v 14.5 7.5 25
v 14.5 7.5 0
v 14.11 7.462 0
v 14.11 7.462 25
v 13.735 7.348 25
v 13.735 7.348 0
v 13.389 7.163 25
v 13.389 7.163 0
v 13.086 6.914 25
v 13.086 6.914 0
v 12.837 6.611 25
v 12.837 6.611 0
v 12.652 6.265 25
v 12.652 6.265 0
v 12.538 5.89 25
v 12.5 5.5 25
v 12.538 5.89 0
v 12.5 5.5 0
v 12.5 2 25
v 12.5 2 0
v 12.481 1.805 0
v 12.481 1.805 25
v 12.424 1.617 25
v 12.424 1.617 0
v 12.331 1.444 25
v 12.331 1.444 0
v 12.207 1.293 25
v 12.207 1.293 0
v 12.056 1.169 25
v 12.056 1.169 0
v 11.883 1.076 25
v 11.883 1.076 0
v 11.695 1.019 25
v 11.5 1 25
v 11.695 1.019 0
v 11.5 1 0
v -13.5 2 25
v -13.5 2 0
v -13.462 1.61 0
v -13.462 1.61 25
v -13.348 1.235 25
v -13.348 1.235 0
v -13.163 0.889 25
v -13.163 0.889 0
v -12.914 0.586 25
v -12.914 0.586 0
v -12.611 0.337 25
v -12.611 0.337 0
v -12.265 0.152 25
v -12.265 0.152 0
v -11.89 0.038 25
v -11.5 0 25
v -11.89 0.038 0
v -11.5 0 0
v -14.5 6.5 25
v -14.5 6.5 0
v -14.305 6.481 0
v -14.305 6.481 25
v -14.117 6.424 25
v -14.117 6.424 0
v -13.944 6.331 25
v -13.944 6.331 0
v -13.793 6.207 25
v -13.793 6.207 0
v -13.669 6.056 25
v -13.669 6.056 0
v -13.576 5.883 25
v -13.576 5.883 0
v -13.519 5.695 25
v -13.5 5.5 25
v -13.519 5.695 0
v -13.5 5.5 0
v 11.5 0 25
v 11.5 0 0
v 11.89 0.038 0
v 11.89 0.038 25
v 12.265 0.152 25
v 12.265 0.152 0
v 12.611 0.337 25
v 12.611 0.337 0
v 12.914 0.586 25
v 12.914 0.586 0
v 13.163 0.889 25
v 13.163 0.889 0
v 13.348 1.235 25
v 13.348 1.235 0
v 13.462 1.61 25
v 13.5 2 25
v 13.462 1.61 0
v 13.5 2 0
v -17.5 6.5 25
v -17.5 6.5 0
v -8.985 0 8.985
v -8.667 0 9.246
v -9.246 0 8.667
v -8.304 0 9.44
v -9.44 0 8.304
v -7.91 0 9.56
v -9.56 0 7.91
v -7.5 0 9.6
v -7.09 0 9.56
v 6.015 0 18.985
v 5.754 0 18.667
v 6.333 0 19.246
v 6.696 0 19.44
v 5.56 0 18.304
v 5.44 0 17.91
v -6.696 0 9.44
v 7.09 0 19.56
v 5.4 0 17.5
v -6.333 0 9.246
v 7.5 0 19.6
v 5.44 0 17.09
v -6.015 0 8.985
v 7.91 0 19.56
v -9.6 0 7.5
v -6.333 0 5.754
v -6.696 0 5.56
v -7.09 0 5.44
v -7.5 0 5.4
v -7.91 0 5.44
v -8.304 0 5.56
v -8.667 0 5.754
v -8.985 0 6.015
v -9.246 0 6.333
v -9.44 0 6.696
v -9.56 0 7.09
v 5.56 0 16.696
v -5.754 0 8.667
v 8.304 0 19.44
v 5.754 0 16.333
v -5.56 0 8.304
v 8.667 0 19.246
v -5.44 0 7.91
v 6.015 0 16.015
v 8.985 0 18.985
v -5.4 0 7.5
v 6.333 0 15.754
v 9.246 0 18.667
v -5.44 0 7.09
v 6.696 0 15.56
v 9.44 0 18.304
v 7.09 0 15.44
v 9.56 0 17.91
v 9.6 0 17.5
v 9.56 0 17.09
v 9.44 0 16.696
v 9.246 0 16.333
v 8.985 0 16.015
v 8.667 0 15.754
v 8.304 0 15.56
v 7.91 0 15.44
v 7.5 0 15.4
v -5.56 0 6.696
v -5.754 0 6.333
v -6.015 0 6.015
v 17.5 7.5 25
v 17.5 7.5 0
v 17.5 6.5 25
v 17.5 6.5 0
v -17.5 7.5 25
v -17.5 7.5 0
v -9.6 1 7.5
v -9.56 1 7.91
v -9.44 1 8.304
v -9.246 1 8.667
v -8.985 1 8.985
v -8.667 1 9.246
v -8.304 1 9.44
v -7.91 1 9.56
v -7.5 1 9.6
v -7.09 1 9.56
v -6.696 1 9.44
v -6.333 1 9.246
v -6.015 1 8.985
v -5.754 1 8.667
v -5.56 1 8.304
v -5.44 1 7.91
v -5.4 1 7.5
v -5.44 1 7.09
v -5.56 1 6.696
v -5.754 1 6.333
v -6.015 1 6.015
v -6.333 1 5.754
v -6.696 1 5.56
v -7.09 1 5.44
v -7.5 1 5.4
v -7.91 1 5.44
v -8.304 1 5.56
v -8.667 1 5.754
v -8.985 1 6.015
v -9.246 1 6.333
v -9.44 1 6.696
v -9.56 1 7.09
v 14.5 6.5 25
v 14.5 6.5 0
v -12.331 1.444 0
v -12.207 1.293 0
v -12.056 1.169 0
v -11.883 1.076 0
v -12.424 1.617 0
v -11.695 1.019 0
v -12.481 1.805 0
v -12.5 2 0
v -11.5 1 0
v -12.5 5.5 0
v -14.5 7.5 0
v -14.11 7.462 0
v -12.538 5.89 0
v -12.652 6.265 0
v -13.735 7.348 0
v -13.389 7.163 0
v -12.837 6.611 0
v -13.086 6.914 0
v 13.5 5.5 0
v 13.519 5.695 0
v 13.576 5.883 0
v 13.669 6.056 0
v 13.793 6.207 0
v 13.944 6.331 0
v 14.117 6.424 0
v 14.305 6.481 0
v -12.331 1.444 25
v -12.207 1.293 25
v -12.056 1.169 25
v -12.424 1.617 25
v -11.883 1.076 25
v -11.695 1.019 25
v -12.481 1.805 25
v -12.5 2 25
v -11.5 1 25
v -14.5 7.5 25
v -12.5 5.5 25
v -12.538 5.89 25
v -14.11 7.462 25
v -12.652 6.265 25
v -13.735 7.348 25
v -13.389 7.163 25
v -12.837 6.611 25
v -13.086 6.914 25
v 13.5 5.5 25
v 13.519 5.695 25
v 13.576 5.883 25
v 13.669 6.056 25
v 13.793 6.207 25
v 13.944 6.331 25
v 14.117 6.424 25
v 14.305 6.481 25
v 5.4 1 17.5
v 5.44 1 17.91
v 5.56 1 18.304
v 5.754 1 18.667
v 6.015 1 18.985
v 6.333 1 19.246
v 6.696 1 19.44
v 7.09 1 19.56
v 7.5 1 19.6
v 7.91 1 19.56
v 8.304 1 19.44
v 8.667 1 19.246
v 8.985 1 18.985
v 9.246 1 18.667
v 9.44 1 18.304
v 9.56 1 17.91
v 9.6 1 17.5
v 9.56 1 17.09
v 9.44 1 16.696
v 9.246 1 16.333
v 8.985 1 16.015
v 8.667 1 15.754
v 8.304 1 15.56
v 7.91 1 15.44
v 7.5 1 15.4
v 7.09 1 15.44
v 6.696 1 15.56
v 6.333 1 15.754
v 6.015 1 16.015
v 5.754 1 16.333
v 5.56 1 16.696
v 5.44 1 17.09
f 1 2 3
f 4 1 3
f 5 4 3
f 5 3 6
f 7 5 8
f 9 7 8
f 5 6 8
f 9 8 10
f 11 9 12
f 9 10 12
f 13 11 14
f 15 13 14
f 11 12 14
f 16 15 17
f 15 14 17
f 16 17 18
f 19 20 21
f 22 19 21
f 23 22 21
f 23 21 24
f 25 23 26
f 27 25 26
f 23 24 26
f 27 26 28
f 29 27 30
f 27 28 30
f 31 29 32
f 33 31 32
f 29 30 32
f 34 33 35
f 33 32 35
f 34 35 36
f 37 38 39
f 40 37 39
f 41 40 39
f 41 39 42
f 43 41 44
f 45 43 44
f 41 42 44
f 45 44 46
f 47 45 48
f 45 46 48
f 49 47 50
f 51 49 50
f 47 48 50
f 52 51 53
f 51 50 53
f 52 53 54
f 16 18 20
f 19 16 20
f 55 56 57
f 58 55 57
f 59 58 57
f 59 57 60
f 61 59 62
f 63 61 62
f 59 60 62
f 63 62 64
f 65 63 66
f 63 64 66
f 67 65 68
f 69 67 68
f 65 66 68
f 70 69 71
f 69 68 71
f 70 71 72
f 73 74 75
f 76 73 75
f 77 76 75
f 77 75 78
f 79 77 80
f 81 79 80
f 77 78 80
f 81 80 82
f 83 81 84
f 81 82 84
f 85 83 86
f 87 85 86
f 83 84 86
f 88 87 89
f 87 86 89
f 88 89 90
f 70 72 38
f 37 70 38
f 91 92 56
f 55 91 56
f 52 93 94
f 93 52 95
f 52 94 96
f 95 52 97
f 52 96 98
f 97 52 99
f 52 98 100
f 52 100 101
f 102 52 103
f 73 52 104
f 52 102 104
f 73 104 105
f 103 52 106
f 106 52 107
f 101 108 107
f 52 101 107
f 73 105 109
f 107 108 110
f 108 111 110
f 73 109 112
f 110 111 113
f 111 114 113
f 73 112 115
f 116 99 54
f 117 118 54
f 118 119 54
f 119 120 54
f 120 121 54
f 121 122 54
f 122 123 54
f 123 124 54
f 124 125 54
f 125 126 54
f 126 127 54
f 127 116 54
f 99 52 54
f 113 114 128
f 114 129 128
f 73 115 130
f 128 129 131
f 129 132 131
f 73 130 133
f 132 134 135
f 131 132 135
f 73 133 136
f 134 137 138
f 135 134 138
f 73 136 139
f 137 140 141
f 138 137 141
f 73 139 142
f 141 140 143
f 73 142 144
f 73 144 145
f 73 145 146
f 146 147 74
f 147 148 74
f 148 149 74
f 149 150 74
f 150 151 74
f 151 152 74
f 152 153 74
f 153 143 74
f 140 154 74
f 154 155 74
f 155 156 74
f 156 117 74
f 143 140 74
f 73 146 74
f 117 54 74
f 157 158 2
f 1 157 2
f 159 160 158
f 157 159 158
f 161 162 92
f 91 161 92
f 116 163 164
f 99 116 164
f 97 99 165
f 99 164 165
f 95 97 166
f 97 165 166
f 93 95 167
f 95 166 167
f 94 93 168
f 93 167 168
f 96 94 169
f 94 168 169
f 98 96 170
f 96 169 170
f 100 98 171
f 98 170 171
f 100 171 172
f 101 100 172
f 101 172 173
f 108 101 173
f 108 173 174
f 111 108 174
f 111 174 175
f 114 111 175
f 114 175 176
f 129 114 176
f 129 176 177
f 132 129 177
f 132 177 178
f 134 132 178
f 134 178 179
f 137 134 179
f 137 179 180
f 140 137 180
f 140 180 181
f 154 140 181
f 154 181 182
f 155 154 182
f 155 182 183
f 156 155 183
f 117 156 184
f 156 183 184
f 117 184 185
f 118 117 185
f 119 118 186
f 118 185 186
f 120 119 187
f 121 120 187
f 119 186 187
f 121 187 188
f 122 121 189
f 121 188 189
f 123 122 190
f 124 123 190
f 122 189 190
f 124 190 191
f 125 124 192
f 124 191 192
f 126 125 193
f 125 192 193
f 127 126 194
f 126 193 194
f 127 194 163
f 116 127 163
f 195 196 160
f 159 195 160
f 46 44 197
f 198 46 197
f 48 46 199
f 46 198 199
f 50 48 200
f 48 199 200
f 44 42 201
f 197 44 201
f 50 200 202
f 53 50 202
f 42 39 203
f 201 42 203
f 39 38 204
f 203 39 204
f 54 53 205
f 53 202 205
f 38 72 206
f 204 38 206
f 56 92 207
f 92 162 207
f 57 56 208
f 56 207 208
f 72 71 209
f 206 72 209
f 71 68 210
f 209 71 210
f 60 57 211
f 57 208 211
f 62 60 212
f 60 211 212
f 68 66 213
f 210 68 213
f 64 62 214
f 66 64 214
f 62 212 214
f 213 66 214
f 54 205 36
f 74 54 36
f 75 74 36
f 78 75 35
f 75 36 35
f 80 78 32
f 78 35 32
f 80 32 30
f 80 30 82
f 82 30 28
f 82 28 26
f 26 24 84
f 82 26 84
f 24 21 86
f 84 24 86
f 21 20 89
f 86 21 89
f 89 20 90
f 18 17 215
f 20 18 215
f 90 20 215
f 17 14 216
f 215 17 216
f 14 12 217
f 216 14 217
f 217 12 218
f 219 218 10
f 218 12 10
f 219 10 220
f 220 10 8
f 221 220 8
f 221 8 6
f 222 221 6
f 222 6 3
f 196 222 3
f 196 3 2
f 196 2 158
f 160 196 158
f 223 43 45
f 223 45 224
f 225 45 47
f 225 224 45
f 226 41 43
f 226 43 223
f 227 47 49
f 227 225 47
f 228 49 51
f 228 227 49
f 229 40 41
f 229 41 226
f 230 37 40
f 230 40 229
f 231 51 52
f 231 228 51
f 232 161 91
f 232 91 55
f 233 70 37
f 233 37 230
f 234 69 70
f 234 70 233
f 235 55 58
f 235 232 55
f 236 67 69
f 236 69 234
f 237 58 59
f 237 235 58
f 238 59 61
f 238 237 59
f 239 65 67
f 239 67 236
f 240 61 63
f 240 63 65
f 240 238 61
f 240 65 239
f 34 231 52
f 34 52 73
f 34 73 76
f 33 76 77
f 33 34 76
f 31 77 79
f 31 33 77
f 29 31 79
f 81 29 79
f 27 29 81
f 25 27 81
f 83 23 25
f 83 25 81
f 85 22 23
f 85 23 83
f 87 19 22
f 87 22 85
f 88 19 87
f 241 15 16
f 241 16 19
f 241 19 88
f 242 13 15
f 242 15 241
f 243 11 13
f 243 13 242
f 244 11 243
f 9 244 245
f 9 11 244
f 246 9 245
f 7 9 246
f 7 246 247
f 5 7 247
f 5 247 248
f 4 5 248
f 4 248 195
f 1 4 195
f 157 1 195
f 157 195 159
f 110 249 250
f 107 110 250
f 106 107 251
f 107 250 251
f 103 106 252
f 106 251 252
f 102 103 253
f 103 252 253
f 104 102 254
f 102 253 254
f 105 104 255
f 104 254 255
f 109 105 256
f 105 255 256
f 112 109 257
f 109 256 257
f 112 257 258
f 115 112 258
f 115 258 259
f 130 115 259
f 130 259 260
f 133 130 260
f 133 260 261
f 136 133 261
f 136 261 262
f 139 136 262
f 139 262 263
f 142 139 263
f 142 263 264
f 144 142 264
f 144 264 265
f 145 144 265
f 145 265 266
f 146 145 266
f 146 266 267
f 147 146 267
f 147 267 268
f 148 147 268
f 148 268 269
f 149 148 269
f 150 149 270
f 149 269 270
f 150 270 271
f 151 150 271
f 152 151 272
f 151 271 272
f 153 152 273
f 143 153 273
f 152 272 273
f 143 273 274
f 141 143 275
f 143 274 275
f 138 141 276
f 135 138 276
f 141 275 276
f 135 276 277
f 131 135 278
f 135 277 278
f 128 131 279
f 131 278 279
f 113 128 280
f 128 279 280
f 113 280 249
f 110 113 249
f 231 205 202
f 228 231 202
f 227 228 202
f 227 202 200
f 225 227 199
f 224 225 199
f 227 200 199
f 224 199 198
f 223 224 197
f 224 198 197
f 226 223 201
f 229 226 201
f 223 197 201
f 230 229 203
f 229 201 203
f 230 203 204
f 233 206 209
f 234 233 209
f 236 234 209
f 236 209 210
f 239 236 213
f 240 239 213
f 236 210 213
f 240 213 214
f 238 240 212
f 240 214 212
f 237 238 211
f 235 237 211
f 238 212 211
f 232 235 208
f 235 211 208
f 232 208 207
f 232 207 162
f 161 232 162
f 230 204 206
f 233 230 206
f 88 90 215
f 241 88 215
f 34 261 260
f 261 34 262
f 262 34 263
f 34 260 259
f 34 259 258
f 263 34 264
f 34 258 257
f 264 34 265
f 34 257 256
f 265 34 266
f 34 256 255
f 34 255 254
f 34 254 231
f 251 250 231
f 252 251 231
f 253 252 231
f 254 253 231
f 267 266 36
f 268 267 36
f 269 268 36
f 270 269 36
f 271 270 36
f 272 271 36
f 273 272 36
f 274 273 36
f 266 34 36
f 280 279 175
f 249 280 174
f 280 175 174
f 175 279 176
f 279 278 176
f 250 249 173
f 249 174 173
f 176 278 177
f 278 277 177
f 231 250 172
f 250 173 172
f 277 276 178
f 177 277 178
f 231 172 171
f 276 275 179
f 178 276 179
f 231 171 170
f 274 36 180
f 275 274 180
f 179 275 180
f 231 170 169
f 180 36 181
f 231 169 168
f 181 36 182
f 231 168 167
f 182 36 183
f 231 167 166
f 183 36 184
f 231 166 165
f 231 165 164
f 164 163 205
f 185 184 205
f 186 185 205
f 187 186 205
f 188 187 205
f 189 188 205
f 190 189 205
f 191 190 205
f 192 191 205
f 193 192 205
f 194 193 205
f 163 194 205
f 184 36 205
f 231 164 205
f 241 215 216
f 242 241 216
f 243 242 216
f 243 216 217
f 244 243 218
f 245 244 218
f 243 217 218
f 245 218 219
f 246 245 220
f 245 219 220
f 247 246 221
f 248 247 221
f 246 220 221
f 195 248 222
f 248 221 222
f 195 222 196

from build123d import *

# Parameters (mm, degrees)
EXTRUDE_1_DEPTH     = 90
CUT_EXTRUDE_START   = -65
CUT_EXTRUDE_2_DEPTH = 65
SKETCH_4_R          = 2.1
CUT_EXTRUDE_3_DEPTH = 10


with BuildPart() as part:
    # Эскиз1 → Вытянуть1 (new body)
    with BuildSketch(Plane.XY):
        with BuildLine():
            Line((-17.5, 6.5), (-14.5, 6.5))
            ThreePointArc((-14.5, 6.5), (-13.792893219, 6.207106781), (-13.5, 5.5))
            Line((-13.5, 5.5), (-13.5, 2))
            ThreePointArc((-13.5, 2), (-12.914213562, 0.585786438), (-11.5, 0))
            Line((-11.5, 0), (11.5, 0))
            ThreePointArc((11.5, 0), (12.914213562, 0.585786438), (13.5, 2))
            Line((13.5, 2), (13.5, 5.5))
            ThreePointArc((13.5, 5.5), (13.792893219, 6.207106781), (14.5, 6.5))
            Line((14.5, 6.5), (17.5, 6.5))
            Line((17.5, 6.5), (17.5, 7.5))
            Line((17.5, 7.5), (14.5, 7.5))
            ThreePointArc((14.5, 7.5), (13.085786438, 6.914213562), (12.5, 5.5))
            Line((12.5, 5.5), (12.5, 2))
            ThreePointArc((12.5, 2), (12.207106781, 1.292893219), (11.5, 1))
            Line((11.5, 1), (-11.5, 1))
            ThreePointArc((-11.5, 1), (-12.207106781, 1.292893219), (-12.5, 2))
            Line((-12.5, 2), (-12.5, 5.5))
            ThreePointArc((-12.5, 5.5), (-13.085786438, 6.914213562), (-14.5, 7.5))
            Line((-14.5, 7.5), (-17.5, 7.5))
            Line((-17.5, 7.5), (-17.5, 6.5))
        make_face()
    extrude(amount=EXTRUDE_1_DEPTH)

    # Эскиз3 → Вырез-Вытянуть2 (cut)
    with BuildSketch(Plane.XY.offset(90).offset(CUT_EXTRUDE_START)):
        with BuildLine():
            Line((-17.5, 7.5), (-17.5, 6.5))
            Line((-17.5, 6.5), (-14.5, 6.5))
            ThreePointArc((-14.5, 6.5), (-13.792893219, 6.207106781), (-13.5, 5.5))
            Line((-13.5, 5.5), (-13.5, 2))
            ThreePointArc((-13.5, 2), (-12.914213562, 0.585786438), (-11.5, 0))
            Line((-11.5, 0), (11.5, 0))
            ThreePointArc((11.5, 0), (12.914213562, 0.585786438), (13.5, 2))
            Line((13.5, 2), (13.5, 5.5))
            ThreePointArc((13.5, 5.5), (13.792893219, 6.207106781), (14.5, 6.5))
            Line((14.5, 6.5), (17.5, 6.5))
            Line((17.5, 6.5), (17.5, 7.5))
            Line((17.5, 7.5), (14.5, 7.5))
            ThreePointArc((14.5, 7.5), (13.085786438, 6.914213562), (12.5, 5.5))
            Line((12.5, 5.5), (12.5, 2))
            ThreePointArc((12.5, 2), (12.207106781, 1.292893219), (11.5, 1))
            Line((11.5, 1), (-11.5, 1))
            ThreePointArc((-11.5, 1), (-12.207106781, 1.292893219), (-12.5, 2))
            Line((-12.5, 2), (-12.5, 5.5))
            ThreePointArc((-12.5, 5.5), (-13.085786438, 6.914213562), (-14.5, 7.5))
            Line((-14.5, 7.5), (-17.5, 7.5))
        make_face()
    extrude(amount=CUT_EXTRUDE_2_DEPTH, mode=Mode.SUBTRACT)

    # Эскиз4 → Вырез-Вытянуть3 (cut)
    with BuildSketch(Plane(origin=(0, 1, 0), x_dir=(-1, 0, 0), z_dir=(0, 1, 0))):
        with Locations((7.5, 7.5)):
            Circle(SKETCH_4_R)
        with Locations((-7.5, 17.5)):
            Circle(SKETCH_4_R)
    extrude(amount=-CUT_EXTRUDE_3_DEPTH, mode=Mode.SUBTRACT)


solid = part.part
